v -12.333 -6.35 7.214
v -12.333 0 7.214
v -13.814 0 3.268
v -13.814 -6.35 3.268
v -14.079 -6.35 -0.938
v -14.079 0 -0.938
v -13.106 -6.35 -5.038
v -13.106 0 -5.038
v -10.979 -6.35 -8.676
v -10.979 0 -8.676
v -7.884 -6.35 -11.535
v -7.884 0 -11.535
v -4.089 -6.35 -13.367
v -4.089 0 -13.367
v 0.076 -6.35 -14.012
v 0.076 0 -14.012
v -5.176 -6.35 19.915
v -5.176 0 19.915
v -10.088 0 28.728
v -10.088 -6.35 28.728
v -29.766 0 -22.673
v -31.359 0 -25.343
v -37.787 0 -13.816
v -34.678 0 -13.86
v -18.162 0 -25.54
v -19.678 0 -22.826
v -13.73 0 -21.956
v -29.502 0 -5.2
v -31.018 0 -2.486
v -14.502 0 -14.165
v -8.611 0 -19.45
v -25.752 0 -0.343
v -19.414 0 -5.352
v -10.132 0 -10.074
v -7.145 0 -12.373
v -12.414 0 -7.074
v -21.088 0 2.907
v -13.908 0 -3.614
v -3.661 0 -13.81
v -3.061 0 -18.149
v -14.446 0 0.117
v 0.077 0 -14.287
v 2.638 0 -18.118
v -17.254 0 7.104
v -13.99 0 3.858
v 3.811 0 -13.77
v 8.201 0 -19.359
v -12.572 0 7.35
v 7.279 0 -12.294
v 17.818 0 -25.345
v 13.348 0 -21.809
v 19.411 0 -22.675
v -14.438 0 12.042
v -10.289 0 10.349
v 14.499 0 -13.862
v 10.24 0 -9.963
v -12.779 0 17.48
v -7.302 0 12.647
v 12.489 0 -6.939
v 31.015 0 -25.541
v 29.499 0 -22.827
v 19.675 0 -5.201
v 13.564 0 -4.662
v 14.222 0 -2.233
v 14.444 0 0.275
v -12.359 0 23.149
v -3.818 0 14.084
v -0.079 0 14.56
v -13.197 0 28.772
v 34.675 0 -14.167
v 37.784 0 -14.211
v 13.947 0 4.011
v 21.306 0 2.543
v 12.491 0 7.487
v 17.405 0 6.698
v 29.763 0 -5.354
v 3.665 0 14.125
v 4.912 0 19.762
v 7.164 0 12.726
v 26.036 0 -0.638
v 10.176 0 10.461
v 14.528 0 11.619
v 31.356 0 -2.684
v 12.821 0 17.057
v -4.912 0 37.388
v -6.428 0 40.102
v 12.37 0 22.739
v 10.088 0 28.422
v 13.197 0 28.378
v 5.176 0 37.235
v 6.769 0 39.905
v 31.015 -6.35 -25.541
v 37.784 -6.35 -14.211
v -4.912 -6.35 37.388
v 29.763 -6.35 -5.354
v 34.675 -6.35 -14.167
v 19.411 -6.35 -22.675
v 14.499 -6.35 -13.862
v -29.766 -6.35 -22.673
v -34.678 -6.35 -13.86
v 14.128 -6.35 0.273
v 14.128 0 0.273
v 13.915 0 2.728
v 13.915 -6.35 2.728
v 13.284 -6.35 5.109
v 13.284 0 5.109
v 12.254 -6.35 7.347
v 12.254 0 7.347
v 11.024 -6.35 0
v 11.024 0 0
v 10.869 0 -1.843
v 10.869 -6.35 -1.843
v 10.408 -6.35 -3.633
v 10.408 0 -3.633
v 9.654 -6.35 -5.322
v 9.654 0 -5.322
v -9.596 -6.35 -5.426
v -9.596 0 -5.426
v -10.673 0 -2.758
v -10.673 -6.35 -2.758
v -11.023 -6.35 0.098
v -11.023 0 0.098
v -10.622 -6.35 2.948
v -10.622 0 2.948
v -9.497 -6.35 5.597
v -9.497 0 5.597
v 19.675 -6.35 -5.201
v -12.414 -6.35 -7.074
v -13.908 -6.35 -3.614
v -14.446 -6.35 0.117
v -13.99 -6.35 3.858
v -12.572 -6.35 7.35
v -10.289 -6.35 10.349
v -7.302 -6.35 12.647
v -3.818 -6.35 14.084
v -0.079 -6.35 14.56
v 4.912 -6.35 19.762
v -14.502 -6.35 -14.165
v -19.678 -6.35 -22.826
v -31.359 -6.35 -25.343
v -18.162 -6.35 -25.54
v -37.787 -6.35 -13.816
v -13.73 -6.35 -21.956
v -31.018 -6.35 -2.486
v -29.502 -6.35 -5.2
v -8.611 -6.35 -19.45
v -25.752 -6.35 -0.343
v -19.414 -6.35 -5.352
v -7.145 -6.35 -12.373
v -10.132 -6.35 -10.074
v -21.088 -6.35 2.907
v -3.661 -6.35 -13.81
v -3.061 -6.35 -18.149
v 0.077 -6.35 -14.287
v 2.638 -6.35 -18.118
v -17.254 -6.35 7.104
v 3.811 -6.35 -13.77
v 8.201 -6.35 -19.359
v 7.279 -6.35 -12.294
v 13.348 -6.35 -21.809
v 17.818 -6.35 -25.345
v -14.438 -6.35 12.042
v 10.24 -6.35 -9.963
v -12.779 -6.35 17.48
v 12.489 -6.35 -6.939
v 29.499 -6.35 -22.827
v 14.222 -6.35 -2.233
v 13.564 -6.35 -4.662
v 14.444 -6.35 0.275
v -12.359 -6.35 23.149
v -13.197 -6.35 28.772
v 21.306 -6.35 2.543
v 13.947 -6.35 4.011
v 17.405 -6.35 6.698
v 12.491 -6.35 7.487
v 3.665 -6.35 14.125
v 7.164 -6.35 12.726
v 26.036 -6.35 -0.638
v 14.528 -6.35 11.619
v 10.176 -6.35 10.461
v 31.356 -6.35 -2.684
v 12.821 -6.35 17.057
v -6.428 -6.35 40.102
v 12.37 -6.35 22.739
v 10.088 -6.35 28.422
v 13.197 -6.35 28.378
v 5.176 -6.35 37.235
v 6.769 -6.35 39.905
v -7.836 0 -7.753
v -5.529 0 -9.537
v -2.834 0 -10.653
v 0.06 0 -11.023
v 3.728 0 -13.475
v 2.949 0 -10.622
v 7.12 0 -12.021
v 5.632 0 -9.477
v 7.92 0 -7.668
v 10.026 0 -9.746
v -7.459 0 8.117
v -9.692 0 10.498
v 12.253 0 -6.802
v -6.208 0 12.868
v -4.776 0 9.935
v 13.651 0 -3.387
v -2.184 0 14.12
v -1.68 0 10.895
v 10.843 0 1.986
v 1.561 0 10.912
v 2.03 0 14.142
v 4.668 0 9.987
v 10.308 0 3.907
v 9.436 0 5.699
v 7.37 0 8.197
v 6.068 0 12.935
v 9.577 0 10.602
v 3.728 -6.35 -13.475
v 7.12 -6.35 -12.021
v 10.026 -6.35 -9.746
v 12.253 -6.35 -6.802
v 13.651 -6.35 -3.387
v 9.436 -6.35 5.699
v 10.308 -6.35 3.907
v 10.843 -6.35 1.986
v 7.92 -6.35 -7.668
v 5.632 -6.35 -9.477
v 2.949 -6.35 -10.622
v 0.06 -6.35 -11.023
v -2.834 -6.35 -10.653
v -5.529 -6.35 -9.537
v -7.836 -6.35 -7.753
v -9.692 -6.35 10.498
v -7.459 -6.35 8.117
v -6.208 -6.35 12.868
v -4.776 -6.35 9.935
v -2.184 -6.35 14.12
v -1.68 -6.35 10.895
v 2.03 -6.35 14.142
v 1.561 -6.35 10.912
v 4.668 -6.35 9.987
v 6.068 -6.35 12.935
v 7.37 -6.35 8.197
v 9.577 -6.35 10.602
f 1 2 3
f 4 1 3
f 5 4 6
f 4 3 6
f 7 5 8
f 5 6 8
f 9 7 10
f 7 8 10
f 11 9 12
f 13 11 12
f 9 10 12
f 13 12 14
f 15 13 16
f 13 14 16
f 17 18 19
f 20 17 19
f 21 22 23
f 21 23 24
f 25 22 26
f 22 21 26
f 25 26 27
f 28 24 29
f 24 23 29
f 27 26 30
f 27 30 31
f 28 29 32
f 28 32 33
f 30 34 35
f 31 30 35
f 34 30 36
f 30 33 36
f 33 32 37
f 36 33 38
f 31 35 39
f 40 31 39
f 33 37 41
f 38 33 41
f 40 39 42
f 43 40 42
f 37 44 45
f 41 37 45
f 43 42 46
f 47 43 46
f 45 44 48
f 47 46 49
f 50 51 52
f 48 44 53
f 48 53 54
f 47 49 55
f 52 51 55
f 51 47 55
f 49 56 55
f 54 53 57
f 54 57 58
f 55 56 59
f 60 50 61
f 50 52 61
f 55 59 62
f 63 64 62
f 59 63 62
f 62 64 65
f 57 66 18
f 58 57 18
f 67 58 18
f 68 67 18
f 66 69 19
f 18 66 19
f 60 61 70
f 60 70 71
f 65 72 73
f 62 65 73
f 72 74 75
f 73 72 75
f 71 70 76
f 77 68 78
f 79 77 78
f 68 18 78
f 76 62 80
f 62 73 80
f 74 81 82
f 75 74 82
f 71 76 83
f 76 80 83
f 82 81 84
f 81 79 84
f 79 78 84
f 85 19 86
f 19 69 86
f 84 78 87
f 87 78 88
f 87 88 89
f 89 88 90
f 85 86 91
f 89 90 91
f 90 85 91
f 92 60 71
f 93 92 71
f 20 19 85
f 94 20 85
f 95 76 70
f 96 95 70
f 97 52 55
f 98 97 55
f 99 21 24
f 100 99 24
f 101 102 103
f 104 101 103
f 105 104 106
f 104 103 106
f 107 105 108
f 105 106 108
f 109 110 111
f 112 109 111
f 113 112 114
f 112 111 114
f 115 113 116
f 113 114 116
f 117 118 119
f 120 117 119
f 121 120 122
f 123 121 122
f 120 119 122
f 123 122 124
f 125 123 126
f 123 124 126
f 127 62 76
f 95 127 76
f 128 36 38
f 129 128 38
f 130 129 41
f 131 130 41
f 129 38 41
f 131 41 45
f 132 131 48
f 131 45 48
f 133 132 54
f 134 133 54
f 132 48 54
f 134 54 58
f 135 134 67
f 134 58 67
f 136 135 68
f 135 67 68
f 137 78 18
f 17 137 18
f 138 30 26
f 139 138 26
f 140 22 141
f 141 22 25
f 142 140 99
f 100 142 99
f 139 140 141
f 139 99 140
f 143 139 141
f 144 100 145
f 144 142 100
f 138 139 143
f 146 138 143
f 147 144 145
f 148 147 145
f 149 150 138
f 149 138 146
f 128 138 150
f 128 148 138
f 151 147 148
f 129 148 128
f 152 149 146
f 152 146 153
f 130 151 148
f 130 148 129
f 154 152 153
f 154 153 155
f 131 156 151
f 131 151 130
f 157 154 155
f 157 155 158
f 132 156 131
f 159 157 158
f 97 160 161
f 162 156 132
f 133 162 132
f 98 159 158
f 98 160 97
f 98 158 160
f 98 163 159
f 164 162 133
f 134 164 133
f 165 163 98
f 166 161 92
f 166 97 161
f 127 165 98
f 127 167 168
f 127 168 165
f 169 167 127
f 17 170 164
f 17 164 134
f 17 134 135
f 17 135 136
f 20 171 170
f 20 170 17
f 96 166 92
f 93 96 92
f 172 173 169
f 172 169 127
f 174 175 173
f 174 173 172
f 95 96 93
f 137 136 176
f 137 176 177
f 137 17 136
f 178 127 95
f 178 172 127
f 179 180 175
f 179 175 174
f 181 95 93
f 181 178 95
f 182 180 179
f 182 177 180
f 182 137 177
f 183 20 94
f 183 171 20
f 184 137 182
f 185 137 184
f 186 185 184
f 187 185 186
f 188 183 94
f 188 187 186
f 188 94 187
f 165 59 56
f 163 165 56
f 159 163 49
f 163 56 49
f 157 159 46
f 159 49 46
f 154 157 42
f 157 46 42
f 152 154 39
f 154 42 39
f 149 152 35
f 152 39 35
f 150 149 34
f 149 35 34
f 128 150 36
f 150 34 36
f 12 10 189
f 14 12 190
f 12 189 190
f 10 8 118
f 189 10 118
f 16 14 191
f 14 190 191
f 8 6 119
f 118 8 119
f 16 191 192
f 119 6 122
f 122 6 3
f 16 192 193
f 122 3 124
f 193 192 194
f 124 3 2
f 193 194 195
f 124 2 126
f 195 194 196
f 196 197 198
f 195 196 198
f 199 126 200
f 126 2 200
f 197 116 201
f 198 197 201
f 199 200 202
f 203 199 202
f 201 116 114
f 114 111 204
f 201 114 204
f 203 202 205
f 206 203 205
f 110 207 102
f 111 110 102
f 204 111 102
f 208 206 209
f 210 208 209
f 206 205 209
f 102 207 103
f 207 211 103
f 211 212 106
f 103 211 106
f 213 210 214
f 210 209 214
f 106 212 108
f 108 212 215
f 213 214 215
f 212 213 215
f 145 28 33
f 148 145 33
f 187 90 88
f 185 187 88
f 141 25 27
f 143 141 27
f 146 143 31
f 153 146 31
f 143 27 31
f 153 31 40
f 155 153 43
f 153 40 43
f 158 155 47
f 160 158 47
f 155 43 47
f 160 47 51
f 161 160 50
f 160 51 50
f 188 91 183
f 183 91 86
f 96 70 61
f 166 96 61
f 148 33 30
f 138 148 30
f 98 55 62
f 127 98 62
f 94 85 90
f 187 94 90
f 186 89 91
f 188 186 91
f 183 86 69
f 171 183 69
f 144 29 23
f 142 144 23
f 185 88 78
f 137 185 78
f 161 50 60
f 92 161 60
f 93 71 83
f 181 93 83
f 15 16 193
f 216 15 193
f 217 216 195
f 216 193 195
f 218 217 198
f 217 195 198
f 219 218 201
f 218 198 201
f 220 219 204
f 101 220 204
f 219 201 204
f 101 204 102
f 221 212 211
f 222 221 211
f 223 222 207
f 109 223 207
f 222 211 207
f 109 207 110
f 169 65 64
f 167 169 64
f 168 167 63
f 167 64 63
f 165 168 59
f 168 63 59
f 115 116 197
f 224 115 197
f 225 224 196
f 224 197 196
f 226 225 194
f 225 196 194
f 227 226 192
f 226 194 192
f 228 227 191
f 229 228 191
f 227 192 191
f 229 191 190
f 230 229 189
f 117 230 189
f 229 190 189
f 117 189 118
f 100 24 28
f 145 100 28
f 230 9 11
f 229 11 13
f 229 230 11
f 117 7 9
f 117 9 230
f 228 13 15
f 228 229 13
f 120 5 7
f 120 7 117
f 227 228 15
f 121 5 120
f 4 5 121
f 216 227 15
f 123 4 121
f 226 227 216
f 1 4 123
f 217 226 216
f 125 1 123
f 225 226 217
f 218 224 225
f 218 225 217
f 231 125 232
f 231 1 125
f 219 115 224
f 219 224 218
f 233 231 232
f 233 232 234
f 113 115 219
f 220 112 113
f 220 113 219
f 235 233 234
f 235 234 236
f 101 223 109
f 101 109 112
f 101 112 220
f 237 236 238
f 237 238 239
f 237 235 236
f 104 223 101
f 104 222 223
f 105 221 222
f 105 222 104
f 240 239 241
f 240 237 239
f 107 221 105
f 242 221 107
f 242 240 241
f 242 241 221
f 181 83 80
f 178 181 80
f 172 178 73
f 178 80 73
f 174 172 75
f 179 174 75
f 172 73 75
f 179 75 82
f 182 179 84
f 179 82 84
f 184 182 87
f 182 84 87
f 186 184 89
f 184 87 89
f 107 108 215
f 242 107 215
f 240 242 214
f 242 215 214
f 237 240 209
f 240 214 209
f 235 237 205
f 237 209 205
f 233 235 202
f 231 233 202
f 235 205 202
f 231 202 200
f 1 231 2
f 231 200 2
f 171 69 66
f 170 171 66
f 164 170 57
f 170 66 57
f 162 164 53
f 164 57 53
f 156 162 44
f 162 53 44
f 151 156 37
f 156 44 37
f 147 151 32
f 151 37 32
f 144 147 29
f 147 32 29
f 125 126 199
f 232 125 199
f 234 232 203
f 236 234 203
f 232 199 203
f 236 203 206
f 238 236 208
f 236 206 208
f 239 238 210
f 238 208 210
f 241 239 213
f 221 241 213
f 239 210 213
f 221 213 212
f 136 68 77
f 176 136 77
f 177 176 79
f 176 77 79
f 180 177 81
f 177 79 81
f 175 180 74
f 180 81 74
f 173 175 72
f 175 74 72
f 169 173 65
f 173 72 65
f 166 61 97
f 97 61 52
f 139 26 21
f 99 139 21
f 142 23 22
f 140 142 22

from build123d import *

# Parameters (mm, degrees)
F1_DEPTH = 6.35


# Not quite as in the source:
# - a feature names something its author has since deleted; it is built from what else it names


with BuildPart() as f1:
    # F0 (on Front) → F1 (new body)
    with BuildSketch(Plane.XZ):
        with BuildLine():
            ThreePointArc((14.1278163557, 0.2731498923), (13.651376792, 3.9320111734), (12.2538333812, 7.346851279))
            ThreePointArc((12.2538333812, 7.346851279), (-0.0774496188, 14.2872900792), (-12.3327636124, 7.2135704011))
            ThreePointArc((-12.3327636124, 7.2135704011), (-12.1777184268, -6.9358533383), (0.0759595105, -14.012406749))
            ThreePointArc((0.0759595105, -14.012406749), (10.026076215, -9.745979428), (14.1278163557, 0.2731498923))
        make_face()
        with BuildLine():
            ThreePointArc((11.1803129237, 0.2748650387), (10.7918465004, -2.6257712301), (9.6538259749, -5.3219734128))
            ThreePointArc((9.6538259749, -5.3219734128), (0.0597566836, -11.0234380344), (-9.5955608055, -5.4263219393))
            ThreePointArc((-9.5955608055, -5.4263219393), (-9.736139361, 5.7331181035), (-0.0612358901, 11.2963102831))
            ThreePointArc((-0.0612358901, 11.2963102831), (7.874134009, 8.1464067398), (11.1803129237, 0.2748650387))
        make_face(mode=Mode.SUBTRACT)
        with BuildLine():
            ThreePointArc((9.4358771612, 5.6994718316), (10.6192535621, 2.9582445374), (11.0236, 0))
            ThreePointArc((11.0236, 0), (10.6756656227, -2.7477118611), (9.6538259749, -5.3219734128))
            ThreePointArc((9.6538259749, -5.3219734128), (10.7918465004, -2.6257712301), (11.1803129237, 0.2748650387))
            ThreePointArc((11.1803129237, 0.2748650387), (7.874134009, 8.1464067398), (-0.0612358901, 11.2963102831))
            ThreePointArc((-0.0612358901, 11.2963102831), (5.4371548072, 9.7702629436), (9.4358771612, 5.6994718316))
        make_face()
        with BuildLine():
            ThreePointArc((-9.4971130513, 5.5968384515), (-0.0597566836, 11.0234380344), (9.4358771612, 5.6994718316))
            ThreePointArc((9.4358771612, 5.6994718316), (5.4371548072, 9.7702629436), (-0.0612358901, 11.2963102831))
            ThreePointArc((-0.0612358901, 11.2963102831), (-5.542758908, 9.7107421999), (-9.4971130513, 5.5968384515))
        make_face()
        with BuildLine():
            ThreePointArc((-9.5955608055, -5.4263219393), (-11.0231603907, 0.0984477542), (-9.4971130513, 5.5968384515))
            ThreePointArc((-9.4971130513, 5.5968384515), (-5.542758908, 9.7107421999), (-0.0612358901, 11.2963102831))
            ThreePointArc((-0.0612358901, 11.2963102831), (-9.736139361, 5.7331181035), (-9.5955608055, -5.4263219393))
        make_face()
    extrude(amount=F1_DEPTH)


with BuildPart() as f1b:
    # F0 (on Front) → F1, piece 2 (new body)
    with BuildSketch(Plane.XZ):
        with BuildLine():
            ThreePointArc((31.3557710331, -2.6839999789), (15.827926935, 9.0774163735), (13.1967604274, 28.378240702))
            Line((13.1967604274, 28.378240702), (6.4279816632, 17.0478905732))
            Line((6.4279816632, 17.0478905732), (-6.7687787642, 17.2446498712))
            Line((-6.7687787642, 17.2446498712), (-13.1967604274, 28.771759298))
            ThreePointArc((-13.1967604274, 28.771759298), (-15.7087414623, 9.494980858), (-31.0179446527, -2.4855255345))
            Line((-31.0179446527, -2.4855255345), (-17.8211842253, -2.6822848325))
            Line((-17.8211842253, -2.6822848325), (-11.3932025621, -14.2093942593))
            Line((-11.3932025621, -14.2093942593), (-18.1619813263, -25.5397443881))
            ThreePointArc((-18.1619813263, -25.5397443881), (-0.2123739316, -17.9729451093), (17.8182135046, -25.3447002365))
            Line((17.8182135046, -25.3447002365), (11.3902318414, -13.8175908097))
            Line((11.3902318414, -13.8175908097), (18.1590106056, -2.4872406809))
            Line((18.1590106056, -2.4872406809), (31.3557710331, -2.6839999789))
        make_face()
        with BuildLine():
            ThreePointArc((14.4442129237, 0.2748650387), (13.9468727552, -3.4619983612), (12.489476536, -6.9387053624))
            ThreePointArc((12.489476536, -6.9387053624), (0.0774496188, -14.2872900792), (-12.4135170255, -7.0737013866))
            ThreePointArc((-12.4135170255, -7.0737013866), (-12.5715646135, 7.3497215946), (-0.0789302311, 14.5604216801))
            ThreePointArc((-0.0789302311, 14.5604216801), (10.175842244, 10.460624898), (14.4442129237, 0.2748650387))
        make_face(mode=Mode.SUBTRACT)
        Polygon((6.4279816632, 17.0478905732), (13.1967604274, 28.378240702), (6.7687787642, 39.9053501288), (-6.4279816632, 40.1021094268), (-13.1967604274, 28.771759298), (-6.7687787642, 17.2446498712), align=None)
        Polygon((5.1762630455, 37.2352832458), (10.0881568176, 28.4223663289), (4.9118937721, 19.7620830831), (-5.1762630455, 19.9147167542), (-10.0881568176, 28.7276336711), (-4.9118937721, 37.3879169169), align=None, mode=Mode.SUBTRACT)
        Polygon((37.7837526963, -14.2111094057), (31.3557710331, -2.6839999789), (18.1590106056, -2.4872406809), (11.3902318414, -13.8175908097), (17.8182135046, -25.3447002365), (31.0149739321, -25.5414595345), align=None)
        Polygon((14.4988354513, -13.8617164365), (19.6750984967, -5.2014331907), (29.7632553143, -5.3540668619), (34.6751490864, -14.1669837788), (29.4988860409, -22.8272670246), (19.4107292234, -22.6746333535), align=None, mode=Mode.SUBTRACT)
        Polygon((-17.8211842253, -2.6822848325), (-31.0179446527, -2.4855255345), (-37.7867234169, -13.8158756633), (-31.3587417537, -25.3429850901), (-18.1619813263, -25.5397443881), (-11.3932025621, -14.2093942593), align=None)
        Polygon((-19.413699944, -5.3523517155), (-14.5018061719, -14.1652686324), (-19.6780692174, -22.8255518782), (-29.7662260349, -22.6729182071), (-34.678119807, -13.8600012902), (-29.5018567616, -5.1997180444), align=None, mode=Mode.SUBTRACT)
    extrude(amount=F1_DEPTH)


solid = Compound([f1.part, f1b.part])
